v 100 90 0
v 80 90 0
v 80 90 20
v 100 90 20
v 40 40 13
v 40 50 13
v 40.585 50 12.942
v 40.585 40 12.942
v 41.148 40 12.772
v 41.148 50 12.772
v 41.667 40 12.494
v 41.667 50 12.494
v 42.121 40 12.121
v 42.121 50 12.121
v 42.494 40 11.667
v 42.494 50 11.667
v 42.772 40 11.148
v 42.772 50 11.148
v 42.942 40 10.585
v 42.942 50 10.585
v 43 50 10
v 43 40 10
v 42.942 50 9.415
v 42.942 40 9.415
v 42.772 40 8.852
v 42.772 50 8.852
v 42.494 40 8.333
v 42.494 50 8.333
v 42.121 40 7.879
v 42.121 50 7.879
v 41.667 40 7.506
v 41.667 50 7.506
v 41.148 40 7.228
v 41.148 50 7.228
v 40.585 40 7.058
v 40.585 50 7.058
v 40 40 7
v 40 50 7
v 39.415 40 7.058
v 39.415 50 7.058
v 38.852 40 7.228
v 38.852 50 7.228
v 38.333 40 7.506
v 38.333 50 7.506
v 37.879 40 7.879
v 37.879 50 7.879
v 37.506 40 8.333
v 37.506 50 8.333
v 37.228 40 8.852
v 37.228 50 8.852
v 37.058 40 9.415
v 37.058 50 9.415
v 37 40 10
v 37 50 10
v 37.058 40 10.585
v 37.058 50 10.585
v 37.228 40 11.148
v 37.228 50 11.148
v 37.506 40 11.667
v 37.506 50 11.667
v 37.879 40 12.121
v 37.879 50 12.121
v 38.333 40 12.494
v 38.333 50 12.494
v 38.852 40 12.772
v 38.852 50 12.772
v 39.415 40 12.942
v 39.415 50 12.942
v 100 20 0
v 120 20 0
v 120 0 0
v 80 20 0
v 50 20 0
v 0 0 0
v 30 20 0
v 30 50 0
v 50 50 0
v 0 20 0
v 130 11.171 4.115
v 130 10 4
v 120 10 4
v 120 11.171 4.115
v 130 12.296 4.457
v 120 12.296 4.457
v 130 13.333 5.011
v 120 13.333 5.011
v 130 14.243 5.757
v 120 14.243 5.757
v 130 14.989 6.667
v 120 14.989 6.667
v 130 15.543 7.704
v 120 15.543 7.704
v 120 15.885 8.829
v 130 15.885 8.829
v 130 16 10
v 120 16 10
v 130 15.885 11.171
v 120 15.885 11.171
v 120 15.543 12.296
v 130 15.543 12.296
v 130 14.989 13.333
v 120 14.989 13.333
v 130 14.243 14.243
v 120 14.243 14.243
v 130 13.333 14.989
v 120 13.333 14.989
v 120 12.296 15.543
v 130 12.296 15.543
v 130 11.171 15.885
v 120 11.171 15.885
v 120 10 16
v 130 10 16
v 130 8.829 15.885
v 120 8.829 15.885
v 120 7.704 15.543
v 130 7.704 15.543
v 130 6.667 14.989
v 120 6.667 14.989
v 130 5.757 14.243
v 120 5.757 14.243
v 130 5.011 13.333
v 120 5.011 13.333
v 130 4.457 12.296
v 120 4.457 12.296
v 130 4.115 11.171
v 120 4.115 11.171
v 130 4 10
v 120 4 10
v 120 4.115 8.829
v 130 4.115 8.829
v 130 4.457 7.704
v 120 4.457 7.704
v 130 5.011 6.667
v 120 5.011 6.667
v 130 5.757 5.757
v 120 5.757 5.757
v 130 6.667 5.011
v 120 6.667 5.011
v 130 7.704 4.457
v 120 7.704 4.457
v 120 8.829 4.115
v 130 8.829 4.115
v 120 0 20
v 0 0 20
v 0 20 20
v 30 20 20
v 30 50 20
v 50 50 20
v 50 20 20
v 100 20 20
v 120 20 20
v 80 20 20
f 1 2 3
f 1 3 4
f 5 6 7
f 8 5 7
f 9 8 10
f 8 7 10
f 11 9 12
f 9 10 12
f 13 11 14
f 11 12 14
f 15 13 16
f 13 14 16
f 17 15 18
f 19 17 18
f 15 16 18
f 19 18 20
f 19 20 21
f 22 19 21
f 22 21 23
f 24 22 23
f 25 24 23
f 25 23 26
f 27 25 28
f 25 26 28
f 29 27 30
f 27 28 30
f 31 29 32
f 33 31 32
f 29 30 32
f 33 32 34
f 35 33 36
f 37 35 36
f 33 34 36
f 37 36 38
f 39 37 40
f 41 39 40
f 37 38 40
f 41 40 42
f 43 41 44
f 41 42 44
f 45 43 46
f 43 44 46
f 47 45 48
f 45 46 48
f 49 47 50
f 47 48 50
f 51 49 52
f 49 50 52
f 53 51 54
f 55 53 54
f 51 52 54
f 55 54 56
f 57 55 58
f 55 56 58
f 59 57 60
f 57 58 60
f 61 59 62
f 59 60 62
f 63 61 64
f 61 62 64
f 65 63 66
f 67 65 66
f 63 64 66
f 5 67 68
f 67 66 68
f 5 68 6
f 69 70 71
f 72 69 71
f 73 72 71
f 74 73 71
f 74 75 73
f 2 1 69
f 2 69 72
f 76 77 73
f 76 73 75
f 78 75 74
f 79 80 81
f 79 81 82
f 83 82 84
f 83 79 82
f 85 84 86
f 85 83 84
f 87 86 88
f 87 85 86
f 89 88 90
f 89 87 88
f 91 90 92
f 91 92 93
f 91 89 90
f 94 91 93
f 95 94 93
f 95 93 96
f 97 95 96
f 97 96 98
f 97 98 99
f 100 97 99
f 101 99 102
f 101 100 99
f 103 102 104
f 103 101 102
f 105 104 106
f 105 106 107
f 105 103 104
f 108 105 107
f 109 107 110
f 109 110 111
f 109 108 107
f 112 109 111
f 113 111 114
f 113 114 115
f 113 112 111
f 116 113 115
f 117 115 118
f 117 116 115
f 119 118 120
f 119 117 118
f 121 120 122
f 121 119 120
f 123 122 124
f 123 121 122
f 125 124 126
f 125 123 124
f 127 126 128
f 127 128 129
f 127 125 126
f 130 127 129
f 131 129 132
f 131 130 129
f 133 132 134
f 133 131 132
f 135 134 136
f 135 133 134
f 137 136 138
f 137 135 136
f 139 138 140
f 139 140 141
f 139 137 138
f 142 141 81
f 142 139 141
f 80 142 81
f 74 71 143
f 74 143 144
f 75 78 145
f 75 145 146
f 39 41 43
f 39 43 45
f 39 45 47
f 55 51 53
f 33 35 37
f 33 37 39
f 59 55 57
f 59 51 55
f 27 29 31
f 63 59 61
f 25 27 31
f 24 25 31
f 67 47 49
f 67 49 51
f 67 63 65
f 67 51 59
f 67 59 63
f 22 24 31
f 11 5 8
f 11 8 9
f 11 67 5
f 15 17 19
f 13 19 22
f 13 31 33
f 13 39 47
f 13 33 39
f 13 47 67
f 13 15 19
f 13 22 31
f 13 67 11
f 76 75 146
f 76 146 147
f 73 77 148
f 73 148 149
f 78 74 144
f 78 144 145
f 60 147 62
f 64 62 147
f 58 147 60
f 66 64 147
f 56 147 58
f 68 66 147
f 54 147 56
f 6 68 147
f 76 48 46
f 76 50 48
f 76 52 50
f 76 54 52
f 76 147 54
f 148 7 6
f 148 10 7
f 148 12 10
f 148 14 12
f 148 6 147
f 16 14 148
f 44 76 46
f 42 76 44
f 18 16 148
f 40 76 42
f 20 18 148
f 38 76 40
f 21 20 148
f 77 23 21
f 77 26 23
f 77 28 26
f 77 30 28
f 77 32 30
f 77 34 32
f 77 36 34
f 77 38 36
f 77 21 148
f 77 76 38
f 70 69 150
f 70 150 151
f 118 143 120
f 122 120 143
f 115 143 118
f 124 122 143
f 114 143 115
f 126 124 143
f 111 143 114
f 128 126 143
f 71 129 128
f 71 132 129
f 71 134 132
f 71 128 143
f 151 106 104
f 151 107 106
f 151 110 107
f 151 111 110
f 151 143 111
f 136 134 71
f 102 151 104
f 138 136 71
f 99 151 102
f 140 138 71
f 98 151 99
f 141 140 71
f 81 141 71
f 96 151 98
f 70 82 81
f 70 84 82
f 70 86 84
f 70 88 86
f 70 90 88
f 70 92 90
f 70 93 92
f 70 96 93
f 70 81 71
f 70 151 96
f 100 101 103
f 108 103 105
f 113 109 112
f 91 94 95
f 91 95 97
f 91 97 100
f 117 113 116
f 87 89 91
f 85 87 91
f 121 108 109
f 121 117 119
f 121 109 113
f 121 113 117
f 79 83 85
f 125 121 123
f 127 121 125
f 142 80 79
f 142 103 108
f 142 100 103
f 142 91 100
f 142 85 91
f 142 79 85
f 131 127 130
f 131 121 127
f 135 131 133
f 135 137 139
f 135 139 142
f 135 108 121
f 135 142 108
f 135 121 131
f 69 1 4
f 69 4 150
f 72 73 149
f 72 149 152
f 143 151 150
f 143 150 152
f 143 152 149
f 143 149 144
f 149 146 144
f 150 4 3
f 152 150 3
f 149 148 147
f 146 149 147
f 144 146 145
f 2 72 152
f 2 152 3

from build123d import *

# Parameters (mm, degrees)
EXTRUDE1_DEPTH     = 20
SKETCH2_R          = 3
CUT_EXTRUDE2_DEPTH = 10
SKETCH3_OUTSIDE_W  = 53.874
SKETCH3_OUTSIDE_H  = 123.874
SKETCH3_OUTSIDE_R  = 6
CUT_EXTRUDE3_DEPTH = 10


with BuildPart() as part:
    # Sketch1 → Extrude1 (new body)
    with BuildSketch(Plane.XY):
        Polygon((30, 50), (50, 50), (50, 20), (80, 20), (80, 90), (100, 90), (100, 20), (130, 20), (130, 0), (0, 0), (0, 20), (30, 20), align=None)
    extrude(amount=EXTRUDE1_DEPTH)

    # Sketch2 → Cut-Extrude2 (cut)
    with BuildSketch(Plane(origin=(0, 50, 0), x_dir=(-1, 0, 0), z_dir=(0, 1, 0))):
        with Locations(Location((-40, 10, 0), (0, 0, 90))):  # turned: the seam where the file's is
            Circle(SKETCH2_R)
    extrude(amount=-CUT_EXTRUDE2_DEPTH, mode=Mode.SUBTRACT)

    # Sketch3 outside → Cut-Extrude3 (cut)
    with BuildSketch(Plane(origin=(130, 0, 0), x_dir=(0, 0, -1), z_dir=(1, 0, 0))):
        with Locations((-10, 45)):
            Rectangle(SKETCH3_OUTSIDE_W, SKETCH3_OUTSIDE_H)
        with Locations((-10, 10)):
            Circle(SKETCH3_OUTSIDE_R, mode=Mode.SUBTRACT)
    extrude(amount=-CUT_EXTRUDE3_DEPTH, mode=Mode.SUBTRACT)


solid = part.part
